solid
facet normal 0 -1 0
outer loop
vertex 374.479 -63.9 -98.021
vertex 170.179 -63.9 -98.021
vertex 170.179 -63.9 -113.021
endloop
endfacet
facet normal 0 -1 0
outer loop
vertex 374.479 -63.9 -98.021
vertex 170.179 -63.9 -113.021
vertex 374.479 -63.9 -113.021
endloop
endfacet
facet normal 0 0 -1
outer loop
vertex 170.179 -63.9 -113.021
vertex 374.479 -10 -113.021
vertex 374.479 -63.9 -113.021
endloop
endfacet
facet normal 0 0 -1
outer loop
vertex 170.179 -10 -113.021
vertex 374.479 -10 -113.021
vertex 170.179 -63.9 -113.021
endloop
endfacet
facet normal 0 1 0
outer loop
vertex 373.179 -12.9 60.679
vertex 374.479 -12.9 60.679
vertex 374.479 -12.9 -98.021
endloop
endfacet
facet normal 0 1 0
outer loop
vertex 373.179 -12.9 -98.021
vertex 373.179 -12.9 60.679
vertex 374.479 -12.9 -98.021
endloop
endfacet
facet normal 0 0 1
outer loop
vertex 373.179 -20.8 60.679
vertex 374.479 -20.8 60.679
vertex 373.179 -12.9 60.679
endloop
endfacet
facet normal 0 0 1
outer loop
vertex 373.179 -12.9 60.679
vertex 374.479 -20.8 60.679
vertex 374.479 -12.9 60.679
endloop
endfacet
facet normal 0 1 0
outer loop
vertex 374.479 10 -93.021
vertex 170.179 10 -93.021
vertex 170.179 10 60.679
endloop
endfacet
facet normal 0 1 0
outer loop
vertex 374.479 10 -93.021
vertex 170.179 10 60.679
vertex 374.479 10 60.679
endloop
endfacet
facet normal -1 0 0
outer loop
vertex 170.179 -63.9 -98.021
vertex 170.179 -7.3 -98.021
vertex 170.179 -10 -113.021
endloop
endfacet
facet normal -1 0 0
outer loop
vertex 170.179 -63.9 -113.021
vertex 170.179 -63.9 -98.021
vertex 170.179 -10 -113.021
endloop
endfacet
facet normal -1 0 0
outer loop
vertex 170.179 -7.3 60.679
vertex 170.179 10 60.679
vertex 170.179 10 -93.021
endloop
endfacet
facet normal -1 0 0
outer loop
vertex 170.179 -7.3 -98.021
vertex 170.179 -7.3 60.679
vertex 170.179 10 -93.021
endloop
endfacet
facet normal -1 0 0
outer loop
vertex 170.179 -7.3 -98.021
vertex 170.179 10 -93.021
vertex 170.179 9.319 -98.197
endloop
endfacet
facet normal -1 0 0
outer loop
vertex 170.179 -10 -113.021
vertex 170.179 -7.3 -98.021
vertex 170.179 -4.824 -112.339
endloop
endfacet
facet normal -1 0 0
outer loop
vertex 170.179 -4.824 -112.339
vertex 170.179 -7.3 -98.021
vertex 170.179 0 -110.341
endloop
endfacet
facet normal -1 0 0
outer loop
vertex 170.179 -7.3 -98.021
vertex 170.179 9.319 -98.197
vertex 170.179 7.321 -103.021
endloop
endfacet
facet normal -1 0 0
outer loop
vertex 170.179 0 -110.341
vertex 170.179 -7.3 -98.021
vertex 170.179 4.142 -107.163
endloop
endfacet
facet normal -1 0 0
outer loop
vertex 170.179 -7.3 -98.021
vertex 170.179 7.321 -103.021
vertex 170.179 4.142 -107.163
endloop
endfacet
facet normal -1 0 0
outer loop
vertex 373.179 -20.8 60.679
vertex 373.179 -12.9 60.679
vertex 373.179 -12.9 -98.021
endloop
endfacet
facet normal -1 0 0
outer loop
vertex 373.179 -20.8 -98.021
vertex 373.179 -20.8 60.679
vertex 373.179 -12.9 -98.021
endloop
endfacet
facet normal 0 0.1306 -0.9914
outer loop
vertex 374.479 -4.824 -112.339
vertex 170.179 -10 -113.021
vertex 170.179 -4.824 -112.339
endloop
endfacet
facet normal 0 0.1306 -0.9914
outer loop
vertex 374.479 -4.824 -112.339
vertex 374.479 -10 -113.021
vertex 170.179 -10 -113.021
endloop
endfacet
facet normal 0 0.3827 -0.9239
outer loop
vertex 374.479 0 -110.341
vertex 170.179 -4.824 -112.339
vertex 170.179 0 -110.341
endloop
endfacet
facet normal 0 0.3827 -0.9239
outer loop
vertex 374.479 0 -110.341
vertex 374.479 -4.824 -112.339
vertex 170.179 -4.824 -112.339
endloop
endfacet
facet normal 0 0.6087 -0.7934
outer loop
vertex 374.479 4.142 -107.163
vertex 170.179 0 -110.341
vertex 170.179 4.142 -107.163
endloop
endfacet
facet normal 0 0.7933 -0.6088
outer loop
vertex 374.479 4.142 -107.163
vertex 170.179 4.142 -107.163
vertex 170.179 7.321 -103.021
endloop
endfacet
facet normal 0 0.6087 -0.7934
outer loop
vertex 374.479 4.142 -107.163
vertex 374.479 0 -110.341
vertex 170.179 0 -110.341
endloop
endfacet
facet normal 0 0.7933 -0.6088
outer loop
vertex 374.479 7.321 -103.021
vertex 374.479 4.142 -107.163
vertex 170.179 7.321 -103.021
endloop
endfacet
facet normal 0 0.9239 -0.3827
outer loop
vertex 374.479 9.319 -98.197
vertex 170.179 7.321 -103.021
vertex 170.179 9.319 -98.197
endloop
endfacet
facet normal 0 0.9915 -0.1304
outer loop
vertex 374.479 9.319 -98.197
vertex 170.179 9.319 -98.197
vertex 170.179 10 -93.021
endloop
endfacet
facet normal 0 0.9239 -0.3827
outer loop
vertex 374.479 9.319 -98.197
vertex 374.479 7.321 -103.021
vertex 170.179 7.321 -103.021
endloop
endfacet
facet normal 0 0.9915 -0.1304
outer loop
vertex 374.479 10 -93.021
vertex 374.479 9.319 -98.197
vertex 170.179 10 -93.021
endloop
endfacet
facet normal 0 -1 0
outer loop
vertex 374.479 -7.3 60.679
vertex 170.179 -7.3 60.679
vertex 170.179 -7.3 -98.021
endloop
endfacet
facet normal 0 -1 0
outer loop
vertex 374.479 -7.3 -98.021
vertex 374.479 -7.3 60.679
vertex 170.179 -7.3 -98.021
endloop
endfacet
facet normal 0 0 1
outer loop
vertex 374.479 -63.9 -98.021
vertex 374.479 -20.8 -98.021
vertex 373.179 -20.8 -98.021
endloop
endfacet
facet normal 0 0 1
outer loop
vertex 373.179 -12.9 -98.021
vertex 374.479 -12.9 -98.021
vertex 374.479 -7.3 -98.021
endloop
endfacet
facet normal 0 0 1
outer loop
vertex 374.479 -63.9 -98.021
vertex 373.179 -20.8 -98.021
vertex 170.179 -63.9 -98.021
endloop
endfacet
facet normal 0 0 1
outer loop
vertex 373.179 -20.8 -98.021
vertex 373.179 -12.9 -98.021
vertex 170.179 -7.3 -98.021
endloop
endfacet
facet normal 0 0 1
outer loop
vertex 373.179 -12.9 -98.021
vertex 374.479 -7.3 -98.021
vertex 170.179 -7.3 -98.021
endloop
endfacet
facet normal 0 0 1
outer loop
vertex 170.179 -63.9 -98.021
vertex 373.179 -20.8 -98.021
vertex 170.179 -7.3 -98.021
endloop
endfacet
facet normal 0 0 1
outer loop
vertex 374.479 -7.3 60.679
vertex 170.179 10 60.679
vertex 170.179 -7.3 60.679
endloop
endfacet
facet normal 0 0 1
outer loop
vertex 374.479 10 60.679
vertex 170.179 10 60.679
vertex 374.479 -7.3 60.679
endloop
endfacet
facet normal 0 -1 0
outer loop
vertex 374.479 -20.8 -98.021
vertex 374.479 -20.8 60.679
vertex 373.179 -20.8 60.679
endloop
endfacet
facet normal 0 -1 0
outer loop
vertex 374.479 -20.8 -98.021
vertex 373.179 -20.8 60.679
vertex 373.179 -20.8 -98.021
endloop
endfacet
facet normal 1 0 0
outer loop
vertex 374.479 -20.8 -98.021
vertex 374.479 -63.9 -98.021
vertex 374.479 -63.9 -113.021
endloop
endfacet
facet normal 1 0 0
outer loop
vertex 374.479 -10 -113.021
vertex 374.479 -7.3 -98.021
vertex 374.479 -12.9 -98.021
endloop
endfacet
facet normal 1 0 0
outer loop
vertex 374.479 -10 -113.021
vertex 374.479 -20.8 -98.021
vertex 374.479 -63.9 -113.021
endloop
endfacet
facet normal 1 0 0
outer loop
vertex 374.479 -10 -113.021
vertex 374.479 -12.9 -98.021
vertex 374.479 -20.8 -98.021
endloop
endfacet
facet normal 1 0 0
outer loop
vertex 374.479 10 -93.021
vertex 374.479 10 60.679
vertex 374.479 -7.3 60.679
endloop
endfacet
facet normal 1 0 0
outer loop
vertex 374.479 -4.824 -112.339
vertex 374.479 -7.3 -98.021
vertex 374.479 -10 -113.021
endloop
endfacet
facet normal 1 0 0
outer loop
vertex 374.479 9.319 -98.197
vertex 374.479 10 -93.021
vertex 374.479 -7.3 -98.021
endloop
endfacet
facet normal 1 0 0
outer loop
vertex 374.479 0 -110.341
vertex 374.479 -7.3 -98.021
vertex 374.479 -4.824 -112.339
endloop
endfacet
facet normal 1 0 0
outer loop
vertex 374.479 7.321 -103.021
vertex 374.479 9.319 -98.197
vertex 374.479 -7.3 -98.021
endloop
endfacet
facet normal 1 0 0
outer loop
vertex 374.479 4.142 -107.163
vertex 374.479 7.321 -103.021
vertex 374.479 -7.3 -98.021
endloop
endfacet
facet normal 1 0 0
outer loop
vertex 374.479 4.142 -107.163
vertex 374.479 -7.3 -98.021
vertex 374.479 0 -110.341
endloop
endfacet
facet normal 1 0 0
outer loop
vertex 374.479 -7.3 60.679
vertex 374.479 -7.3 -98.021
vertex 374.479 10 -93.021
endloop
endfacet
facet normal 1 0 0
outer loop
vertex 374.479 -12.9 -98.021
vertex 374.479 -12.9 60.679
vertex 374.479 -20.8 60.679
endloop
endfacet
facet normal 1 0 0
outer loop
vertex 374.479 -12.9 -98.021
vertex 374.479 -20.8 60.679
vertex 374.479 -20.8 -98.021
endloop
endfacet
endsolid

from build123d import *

# Parameters (mm, degrees)
SKETCH1_W           = 204.3
SKETCH1_H           = 173.7
BOSS_EXTRUDE2_DEPTH = 10
SKETCH4_W           = 204.3
SKETCH4_H           = 15
BOSS_EXTRUDE4_DEPTH = 68.9
SKETCH6_W           = 204.3
SKETCH6_H           = 5
CUT_EXTRUDE1_DEPTH  = 26
SKETCH5_W           = 204.3
SKETCH5_H           = 15
BOSS_EXTRUDE6_DEPTH = 7.3
FILLET1_R           = 20
SKETCH7_W           = 143.7
SKETCH7_H           = 7.3
BOSS_EXTRUDE7_DEPTH = 204.3
SKETCH9_W           = 158.7
SKETCH9_H           = 7.9
BOSS_EXTRUDE9_DEPTH = 1.3


with BuildPart() as part:
    # Sketch1 → Boss-Extrude2 (new body)
    with BuildSketch(Plane(origin=(0, 0, 0), x_dir=(1, 0, 0), z_dir=(0, 1, 0))):
        with Locations((272.329166667, 26.170833333)):
            Rectangle(SKETCH1_W, SKETCH1_H)
    extrude(amount=BOSS_EXTRUDE2_DEPTH)

    # Sketch4 → Boss-Extrude4 (add)
    with BuildSketch(Plane(origin=(0, 0, 0), x_dir=(-1, 0, 0), z_dir=(0, -1, 0))):
        with Locations((-272.329166667, 105.520833333)):
            Rectangle(SKETCH4_W, SKETCH4_H)
    extrude(amount=BOSS_EXTRUDE4_DEPTH)

    # Sketch6 → Cut-Extrude1 (cut)
    with BuildSketch(Plane.XY.offset(-98.020833333)):
        with Locations((272.329166667, -66.4)):
            Rectangle(SKETCH6_W, SKETCH6_H)
    extrude(amount=-CUT_EXTRUDE1_DEPTH, mode=Mode.SUBTRACT)

    # Sketch5 → Boss-Extrude6 (add)
    with BuildSketch(Plane.XZ):
        with Locations((272.329166667, 53.179166667)):
            Rectangle(SKETCH5_W, SKETCH5_H)
    extrude(amount=BOSS_EXTRUDE6_DEPTH)

    # Fillet1
    fillet1_edges = [part.edges().sort_by_distance(p)[0] for p in [
        (272.329166667, 10, -113.020833333),
    ]]
    fillet(fillet1_edges, radius=FILLET1_R)

    # Sketch7 → Boss-Extrude7 (add)
    with BuildSketch(Plane(origin=(374.479166667, 0, 0), x_dir=(0, 0, -1), z_dir=(1, 0, 0))):
        with Locations((26.170833333, -3.65)):
            Rectangle(SKETCH7_W, SKETCH7_H)
    extrude(amount=-BOSS_EXTRUDE7_DEPTH)

    # Sketch9 → Boss-Extrude9 (add)
    with BuildSketch(Plane(origin=(374.479166667, 0, 0), x_dir=(0, 0, -1), z_dir=(1, 0, 0))):
        with Locations((18.670833333, -16.85)):
            Rectangle(SKETCH9_W, SKETCH9_H)
    extrude(amount=-BOSS_EXTRUDE9_DEPTH)


solid = part.part
